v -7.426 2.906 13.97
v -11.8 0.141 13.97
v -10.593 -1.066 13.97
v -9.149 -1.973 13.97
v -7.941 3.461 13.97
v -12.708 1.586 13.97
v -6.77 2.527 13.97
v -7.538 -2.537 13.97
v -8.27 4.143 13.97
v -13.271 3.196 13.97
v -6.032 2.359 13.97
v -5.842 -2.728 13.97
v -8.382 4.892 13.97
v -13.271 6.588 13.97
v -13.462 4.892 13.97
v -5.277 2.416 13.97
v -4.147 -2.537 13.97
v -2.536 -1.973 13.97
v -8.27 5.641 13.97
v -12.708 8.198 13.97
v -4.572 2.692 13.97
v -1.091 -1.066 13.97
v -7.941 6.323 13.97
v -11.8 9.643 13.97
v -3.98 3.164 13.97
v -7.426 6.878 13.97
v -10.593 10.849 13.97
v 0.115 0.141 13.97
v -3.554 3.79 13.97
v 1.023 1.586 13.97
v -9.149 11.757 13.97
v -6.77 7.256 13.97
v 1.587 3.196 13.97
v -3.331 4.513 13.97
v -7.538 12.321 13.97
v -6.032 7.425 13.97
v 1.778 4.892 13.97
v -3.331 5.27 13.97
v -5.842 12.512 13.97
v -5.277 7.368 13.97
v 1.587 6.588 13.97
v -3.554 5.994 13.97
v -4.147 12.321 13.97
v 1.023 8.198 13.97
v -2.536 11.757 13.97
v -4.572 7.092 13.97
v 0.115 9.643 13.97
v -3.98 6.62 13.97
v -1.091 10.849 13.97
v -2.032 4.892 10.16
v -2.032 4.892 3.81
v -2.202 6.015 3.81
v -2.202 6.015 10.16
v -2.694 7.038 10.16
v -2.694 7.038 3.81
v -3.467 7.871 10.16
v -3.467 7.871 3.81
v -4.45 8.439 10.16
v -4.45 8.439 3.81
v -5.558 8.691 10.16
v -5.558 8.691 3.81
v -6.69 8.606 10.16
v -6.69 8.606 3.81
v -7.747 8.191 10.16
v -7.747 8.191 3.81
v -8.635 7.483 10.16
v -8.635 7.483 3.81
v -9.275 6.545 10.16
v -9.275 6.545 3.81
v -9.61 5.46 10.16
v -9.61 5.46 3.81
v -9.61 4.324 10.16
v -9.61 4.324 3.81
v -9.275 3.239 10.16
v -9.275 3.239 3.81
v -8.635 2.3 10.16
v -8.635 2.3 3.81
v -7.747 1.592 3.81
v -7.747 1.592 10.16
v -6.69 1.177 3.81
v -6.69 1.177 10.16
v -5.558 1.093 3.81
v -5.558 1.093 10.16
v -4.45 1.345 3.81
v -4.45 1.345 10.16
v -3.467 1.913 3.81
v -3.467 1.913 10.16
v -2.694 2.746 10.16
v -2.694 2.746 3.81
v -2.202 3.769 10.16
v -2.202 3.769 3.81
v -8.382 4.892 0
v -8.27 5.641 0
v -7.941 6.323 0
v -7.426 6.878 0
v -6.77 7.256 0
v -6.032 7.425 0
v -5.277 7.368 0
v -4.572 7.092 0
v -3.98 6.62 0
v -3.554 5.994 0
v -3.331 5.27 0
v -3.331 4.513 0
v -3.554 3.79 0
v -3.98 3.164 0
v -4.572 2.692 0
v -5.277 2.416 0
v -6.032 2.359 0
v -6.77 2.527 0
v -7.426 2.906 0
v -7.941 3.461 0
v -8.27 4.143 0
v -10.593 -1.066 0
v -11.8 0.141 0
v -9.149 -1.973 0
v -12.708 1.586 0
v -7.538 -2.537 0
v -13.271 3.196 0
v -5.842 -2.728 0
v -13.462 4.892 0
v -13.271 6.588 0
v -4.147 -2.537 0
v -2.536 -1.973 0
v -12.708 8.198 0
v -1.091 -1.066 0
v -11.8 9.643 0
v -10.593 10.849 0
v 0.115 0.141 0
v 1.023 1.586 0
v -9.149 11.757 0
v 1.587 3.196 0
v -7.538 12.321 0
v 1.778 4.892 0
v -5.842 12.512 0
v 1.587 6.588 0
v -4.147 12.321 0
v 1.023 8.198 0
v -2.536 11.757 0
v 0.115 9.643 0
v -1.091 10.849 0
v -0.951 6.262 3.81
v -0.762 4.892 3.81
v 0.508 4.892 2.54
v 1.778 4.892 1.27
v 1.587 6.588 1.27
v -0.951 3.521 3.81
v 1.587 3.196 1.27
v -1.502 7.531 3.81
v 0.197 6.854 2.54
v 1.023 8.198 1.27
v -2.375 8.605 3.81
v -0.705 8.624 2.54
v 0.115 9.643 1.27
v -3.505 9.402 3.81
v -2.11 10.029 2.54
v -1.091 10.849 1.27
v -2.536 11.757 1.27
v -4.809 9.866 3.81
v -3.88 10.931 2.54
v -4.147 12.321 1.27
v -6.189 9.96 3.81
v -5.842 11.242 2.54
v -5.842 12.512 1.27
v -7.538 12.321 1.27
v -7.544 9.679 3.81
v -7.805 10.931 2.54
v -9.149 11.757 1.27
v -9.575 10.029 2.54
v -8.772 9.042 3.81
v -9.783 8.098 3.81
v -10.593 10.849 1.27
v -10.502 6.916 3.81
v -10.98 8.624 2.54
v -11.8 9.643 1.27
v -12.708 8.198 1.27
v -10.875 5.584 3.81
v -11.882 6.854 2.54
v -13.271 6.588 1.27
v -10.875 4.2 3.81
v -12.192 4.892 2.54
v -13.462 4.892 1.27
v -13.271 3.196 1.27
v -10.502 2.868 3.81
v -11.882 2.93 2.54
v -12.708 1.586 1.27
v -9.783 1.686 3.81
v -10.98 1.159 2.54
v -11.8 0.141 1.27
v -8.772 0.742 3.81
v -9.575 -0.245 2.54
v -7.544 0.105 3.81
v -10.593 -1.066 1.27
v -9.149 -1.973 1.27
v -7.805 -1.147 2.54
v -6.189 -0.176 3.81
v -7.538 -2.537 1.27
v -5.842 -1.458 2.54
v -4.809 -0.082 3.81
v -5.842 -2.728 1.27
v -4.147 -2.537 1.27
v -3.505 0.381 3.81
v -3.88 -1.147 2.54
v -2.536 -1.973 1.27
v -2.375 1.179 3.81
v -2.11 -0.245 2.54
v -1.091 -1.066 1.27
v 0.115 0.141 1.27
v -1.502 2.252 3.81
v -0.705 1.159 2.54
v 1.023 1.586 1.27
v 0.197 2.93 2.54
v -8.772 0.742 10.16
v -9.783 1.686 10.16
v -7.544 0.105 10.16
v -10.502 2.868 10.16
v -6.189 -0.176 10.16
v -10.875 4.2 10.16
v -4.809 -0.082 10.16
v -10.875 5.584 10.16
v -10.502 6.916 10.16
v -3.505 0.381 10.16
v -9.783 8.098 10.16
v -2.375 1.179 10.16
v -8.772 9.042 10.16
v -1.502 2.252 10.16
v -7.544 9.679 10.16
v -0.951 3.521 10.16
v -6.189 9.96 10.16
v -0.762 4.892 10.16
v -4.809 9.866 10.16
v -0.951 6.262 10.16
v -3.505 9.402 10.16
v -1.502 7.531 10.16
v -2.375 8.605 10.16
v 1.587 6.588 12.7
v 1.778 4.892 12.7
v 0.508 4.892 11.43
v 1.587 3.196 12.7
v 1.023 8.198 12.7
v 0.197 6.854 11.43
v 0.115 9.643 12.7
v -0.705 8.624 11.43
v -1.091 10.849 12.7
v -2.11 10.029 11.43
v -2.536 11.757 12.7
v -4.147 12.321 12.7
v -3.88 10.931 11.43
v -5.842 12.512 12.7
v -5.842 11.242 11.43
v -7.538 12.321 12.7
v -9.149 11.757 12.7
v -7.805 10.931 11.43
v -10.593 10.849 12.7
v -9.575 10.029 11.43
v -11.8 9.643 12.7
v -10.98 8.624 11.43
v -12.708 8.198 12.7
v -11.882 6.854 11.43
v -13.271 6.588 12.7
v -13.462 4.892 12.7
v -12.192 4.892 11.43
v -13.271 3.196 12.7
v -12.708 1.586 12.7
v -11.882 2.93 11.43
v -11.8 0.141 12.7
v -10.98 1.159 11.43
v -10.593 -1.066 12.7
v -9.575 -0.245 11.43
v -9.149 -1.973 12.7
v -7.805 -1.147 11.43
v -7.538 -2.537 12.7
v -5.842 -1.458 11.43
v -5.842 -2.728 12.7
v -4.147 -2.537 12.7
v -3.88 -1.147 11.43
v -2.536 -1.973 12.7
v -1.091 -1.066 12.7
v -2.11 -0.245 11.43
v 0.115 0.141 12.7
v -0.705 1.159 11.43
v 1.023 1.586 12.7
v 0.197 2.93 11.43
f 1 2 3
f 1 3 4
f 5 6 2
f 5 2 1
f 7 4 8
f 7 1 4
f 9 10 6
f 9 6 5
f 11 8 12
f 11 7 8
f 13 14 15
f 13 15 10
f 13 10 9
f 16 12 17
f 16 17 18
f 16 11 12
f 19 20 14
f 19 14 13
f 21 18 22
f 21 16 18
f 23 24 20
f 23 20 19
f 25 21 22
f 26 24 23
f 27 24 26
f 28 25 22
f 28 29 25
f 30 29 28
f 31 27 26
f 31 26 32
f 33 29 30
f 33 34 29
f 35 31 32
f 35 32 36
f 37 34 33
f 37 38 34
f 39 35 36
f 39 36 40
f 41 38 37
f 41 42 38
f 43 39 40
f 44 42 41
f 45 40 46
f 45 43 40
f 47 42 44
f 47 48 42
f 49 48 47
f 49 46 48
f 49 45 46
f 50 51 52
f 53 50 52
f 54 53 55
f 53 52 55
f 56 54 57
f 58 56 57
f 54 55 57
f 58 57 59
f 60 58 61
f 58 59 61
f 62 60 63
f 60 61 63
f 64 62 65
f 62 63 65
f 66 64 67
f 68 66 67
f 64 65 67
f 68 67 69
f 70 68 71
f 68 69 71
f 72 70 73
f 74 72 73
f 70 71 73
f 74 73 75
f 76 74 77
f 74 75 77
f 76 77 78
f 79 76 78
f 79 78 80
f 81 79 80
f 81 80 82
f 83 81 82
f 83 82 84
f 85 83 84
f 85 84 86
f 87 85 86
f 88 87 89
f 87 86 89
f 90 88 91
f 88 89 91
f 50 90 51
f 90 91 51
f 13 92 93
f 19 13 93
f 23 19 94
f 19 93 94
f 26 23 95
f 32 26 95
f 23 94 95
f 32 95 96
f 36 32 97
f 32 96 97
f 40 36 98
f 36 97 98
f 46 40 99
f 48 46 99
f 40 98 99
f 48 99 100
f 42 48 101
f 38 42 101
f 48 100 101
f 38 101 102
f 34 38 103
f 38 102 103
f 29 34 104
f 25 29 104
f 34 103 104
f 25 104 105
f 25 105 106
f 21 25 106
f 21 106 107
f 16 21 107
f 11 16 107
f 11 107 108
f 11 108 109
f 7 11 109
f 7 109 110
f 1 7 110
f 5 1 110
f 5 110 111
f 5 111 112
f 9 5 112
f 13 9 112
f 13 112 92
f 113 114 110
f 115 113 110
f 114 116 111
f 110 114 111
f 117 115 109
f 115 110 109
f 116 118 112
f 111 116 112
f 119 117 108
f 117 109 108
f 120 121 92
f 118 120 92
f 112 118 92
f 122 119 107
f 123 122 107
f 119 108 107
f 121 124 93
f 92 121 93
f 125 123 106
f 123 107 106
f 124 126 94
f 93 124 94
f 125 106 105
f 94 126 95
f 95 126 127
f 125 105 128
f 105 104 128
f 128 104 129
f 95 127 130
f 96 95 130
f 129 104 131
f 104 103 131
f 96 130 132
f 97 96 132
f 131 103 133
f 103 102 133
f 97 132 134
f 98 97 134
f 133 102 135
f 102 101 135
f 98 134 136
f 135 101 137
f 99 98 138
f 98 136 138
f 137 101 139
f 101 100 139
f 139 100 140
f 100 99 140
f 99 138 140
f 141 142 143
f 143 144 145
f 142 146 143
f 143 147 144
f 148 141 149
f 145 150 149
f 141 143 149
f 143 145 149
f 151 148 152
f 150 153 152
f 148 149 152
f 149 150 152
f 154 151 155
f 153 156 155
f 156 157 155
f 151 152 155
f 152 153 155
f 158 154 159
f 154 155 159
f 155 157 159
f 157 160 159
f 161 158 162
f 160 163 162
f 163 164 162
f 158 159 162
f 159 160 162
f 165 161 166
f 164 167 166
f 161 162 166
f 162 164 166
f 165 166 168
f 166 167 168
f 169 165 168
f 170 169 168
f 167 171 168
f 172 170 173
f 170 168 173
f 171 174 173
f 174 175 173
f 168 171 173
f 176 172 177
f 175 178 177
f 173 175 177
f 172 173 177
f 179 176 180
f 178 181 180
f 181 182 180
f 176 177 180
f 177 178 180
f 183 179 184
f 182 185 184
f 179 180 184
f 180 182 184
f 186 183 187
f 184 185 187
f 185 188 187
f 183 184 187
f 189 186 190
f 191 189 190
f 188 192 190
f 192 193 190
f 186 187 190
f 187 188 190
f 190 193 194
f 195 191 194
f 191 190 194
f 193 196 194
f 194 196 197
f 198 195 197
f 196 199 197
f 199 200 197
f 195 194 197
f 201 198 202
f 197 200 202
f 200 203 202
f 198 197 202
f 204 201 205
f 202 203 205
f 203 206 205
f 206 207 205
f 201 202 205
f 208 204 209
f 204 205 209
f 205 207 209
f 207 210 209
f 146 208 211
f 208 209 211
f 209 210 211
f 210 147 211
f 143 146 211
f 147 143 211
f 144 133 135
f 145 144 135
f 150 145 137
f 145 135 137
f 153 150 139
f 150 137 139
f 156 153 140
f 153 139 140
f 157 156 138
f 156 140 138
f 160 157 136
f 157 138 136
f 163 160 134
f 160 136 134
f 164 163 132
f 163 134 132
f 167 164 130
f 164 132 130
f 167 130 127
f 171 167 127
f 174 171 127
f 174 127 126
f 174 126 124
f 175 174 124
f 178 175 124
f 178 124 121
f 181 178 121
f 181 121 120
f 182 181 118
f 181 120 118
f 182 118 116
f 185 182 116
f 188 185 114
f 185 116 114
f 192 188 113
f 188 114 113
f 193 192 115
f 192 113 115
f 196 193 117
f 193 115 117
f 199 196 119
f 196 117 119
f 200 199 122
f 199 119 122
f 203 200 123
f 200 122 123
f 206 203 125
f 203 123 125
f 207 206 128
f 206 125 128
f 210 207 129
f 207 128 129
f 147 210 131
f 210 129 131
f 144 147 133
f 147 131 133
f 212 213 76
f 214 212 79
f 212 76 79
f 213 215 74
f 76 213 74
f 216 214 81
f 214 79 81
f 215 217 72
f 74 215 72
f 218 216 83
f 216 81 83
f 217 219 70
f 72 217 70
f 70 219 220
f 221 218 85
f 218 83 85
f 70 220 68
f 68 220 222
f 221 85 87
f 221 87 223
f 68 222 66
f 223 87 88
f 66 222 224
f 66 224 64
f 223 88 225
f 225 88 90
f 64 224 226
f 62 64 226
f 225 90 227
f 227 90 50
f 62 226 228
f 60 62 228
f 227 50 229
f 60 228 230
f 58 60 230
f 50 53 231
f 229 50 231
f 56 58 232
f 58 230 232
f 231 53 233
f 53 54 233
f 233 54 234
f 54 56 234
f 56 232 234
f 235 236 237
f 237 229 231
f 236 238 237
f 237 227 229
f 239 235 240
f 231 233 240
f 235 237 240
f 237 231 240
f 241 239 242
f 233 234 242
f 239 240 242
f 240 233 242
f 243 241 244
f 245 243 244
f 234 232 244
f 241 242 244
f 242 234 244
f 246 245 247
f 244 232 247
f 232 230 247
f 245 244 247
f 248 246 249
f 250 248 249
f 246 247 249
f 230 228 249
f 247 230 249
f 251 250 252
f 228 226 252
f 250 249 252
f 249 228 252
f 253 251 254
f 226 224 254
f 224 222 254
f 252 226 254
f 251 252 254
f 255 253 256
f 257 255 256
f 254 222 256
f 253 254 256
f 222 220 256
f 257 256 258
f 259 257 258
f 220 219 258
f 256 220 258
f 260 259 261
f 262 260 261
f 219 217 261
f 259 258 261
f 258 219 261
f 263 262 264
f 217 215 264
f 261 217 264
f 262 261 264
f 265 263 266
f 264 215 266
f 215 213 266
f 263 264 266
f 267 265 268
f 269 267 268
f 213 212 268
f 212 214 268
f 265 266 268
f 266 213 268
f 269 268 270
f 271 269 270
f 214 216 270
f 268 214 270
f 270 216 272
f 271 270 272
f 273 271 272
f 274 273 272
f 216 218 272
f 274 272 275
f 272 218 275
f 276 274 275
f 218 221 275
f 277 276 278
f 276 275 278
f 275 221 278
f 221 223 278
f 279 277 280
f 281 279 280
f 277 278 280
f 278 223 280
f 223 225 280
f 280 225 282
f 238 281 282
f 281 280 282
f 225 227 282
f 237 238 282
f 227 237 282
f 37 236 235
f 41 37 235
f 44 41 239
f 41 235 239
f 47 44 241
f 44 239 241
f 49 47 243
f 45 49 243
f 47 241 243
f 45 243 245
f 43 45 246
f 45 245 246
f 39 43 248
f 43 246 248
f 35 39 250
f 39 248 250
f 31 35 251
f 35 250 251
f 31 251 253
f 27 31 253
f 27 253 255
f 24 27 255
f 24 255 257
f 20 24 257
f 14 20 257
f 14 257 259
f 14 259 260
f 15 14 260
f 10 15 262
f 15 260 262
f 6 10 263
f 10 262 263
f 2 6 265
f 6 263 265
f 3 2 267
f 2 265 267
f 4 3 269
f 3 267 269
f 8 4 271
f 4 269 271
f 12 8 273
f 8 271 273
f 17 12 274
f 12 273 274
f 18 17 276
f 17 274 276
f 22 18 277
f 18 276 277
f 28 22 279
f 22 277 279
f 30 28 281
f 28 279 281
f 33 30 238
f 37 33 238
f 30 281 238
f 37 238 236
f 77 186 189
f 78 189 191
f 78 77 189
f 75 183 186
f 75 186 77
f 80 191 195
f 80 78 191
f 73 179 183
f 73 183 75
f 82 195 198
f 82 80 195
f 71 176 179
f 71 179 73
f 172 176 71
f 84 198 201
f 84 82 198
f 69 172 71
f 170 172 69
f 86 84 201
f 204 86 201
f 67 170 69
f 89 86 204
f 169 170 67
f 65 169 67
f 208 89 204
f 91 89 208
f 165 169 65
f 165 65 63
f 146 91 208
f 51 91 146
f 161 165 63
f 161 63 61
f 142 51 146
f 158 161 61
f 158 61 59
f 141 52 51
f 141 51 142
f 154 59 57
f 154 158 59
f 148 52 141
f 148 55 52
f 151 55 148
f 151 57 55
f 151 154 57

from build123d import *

# Parameters (mm, degrees)
F0_R     = 7.62
F1_DEPTH = 3.81
F2_R     = 3.81
F3_DEPTH = 6.35
F4_R     = 7.62
F5_DEPTH = 3.81
F7_D     = 5.08
F8_SIZE  = 2.54


with BuildPart() as f1:
    # F0 (on Top) → F1 (new body)
    with BuildSketch(Plane.XY):
        with Locations((-5.842393, 4.891916)):
            Circle(F0_R)
    extrude(amount=F1_DEPTH)

    # F2 (on face) → F3 (join)
    with BuildSketch(Plane.XY.offset(3.81)):
        with Locations((-5.842393, 4.891916)):
            Circle(F2_R)
    extrude(amount=F3_DEPTH)

    # F4 (on face) → F5 (join)
    with BuildSketch(Plane.XY.offset(10.16)):
        with Locations((-5.842393, 4.891916)):
            Circle(F4_R)
    extrude(amount=F5_DEPTH)

    # F7 (through all)
    with Locations(Plane.XY.offset(13.97)):
        with Locations((-5.842393, 4.891916)):
            Hole(F7_D / 2)

    # F8
    f8_edges = [f1.edges().sort_by_distance(p)[0] for p in [
        (-13.462393, 4.891916, 10.16),
        (-13.462393, 4.891916, 3.81),
    ]]
    chamfer(f8_edges, length=F8_SIZE)


solid = f1.part
